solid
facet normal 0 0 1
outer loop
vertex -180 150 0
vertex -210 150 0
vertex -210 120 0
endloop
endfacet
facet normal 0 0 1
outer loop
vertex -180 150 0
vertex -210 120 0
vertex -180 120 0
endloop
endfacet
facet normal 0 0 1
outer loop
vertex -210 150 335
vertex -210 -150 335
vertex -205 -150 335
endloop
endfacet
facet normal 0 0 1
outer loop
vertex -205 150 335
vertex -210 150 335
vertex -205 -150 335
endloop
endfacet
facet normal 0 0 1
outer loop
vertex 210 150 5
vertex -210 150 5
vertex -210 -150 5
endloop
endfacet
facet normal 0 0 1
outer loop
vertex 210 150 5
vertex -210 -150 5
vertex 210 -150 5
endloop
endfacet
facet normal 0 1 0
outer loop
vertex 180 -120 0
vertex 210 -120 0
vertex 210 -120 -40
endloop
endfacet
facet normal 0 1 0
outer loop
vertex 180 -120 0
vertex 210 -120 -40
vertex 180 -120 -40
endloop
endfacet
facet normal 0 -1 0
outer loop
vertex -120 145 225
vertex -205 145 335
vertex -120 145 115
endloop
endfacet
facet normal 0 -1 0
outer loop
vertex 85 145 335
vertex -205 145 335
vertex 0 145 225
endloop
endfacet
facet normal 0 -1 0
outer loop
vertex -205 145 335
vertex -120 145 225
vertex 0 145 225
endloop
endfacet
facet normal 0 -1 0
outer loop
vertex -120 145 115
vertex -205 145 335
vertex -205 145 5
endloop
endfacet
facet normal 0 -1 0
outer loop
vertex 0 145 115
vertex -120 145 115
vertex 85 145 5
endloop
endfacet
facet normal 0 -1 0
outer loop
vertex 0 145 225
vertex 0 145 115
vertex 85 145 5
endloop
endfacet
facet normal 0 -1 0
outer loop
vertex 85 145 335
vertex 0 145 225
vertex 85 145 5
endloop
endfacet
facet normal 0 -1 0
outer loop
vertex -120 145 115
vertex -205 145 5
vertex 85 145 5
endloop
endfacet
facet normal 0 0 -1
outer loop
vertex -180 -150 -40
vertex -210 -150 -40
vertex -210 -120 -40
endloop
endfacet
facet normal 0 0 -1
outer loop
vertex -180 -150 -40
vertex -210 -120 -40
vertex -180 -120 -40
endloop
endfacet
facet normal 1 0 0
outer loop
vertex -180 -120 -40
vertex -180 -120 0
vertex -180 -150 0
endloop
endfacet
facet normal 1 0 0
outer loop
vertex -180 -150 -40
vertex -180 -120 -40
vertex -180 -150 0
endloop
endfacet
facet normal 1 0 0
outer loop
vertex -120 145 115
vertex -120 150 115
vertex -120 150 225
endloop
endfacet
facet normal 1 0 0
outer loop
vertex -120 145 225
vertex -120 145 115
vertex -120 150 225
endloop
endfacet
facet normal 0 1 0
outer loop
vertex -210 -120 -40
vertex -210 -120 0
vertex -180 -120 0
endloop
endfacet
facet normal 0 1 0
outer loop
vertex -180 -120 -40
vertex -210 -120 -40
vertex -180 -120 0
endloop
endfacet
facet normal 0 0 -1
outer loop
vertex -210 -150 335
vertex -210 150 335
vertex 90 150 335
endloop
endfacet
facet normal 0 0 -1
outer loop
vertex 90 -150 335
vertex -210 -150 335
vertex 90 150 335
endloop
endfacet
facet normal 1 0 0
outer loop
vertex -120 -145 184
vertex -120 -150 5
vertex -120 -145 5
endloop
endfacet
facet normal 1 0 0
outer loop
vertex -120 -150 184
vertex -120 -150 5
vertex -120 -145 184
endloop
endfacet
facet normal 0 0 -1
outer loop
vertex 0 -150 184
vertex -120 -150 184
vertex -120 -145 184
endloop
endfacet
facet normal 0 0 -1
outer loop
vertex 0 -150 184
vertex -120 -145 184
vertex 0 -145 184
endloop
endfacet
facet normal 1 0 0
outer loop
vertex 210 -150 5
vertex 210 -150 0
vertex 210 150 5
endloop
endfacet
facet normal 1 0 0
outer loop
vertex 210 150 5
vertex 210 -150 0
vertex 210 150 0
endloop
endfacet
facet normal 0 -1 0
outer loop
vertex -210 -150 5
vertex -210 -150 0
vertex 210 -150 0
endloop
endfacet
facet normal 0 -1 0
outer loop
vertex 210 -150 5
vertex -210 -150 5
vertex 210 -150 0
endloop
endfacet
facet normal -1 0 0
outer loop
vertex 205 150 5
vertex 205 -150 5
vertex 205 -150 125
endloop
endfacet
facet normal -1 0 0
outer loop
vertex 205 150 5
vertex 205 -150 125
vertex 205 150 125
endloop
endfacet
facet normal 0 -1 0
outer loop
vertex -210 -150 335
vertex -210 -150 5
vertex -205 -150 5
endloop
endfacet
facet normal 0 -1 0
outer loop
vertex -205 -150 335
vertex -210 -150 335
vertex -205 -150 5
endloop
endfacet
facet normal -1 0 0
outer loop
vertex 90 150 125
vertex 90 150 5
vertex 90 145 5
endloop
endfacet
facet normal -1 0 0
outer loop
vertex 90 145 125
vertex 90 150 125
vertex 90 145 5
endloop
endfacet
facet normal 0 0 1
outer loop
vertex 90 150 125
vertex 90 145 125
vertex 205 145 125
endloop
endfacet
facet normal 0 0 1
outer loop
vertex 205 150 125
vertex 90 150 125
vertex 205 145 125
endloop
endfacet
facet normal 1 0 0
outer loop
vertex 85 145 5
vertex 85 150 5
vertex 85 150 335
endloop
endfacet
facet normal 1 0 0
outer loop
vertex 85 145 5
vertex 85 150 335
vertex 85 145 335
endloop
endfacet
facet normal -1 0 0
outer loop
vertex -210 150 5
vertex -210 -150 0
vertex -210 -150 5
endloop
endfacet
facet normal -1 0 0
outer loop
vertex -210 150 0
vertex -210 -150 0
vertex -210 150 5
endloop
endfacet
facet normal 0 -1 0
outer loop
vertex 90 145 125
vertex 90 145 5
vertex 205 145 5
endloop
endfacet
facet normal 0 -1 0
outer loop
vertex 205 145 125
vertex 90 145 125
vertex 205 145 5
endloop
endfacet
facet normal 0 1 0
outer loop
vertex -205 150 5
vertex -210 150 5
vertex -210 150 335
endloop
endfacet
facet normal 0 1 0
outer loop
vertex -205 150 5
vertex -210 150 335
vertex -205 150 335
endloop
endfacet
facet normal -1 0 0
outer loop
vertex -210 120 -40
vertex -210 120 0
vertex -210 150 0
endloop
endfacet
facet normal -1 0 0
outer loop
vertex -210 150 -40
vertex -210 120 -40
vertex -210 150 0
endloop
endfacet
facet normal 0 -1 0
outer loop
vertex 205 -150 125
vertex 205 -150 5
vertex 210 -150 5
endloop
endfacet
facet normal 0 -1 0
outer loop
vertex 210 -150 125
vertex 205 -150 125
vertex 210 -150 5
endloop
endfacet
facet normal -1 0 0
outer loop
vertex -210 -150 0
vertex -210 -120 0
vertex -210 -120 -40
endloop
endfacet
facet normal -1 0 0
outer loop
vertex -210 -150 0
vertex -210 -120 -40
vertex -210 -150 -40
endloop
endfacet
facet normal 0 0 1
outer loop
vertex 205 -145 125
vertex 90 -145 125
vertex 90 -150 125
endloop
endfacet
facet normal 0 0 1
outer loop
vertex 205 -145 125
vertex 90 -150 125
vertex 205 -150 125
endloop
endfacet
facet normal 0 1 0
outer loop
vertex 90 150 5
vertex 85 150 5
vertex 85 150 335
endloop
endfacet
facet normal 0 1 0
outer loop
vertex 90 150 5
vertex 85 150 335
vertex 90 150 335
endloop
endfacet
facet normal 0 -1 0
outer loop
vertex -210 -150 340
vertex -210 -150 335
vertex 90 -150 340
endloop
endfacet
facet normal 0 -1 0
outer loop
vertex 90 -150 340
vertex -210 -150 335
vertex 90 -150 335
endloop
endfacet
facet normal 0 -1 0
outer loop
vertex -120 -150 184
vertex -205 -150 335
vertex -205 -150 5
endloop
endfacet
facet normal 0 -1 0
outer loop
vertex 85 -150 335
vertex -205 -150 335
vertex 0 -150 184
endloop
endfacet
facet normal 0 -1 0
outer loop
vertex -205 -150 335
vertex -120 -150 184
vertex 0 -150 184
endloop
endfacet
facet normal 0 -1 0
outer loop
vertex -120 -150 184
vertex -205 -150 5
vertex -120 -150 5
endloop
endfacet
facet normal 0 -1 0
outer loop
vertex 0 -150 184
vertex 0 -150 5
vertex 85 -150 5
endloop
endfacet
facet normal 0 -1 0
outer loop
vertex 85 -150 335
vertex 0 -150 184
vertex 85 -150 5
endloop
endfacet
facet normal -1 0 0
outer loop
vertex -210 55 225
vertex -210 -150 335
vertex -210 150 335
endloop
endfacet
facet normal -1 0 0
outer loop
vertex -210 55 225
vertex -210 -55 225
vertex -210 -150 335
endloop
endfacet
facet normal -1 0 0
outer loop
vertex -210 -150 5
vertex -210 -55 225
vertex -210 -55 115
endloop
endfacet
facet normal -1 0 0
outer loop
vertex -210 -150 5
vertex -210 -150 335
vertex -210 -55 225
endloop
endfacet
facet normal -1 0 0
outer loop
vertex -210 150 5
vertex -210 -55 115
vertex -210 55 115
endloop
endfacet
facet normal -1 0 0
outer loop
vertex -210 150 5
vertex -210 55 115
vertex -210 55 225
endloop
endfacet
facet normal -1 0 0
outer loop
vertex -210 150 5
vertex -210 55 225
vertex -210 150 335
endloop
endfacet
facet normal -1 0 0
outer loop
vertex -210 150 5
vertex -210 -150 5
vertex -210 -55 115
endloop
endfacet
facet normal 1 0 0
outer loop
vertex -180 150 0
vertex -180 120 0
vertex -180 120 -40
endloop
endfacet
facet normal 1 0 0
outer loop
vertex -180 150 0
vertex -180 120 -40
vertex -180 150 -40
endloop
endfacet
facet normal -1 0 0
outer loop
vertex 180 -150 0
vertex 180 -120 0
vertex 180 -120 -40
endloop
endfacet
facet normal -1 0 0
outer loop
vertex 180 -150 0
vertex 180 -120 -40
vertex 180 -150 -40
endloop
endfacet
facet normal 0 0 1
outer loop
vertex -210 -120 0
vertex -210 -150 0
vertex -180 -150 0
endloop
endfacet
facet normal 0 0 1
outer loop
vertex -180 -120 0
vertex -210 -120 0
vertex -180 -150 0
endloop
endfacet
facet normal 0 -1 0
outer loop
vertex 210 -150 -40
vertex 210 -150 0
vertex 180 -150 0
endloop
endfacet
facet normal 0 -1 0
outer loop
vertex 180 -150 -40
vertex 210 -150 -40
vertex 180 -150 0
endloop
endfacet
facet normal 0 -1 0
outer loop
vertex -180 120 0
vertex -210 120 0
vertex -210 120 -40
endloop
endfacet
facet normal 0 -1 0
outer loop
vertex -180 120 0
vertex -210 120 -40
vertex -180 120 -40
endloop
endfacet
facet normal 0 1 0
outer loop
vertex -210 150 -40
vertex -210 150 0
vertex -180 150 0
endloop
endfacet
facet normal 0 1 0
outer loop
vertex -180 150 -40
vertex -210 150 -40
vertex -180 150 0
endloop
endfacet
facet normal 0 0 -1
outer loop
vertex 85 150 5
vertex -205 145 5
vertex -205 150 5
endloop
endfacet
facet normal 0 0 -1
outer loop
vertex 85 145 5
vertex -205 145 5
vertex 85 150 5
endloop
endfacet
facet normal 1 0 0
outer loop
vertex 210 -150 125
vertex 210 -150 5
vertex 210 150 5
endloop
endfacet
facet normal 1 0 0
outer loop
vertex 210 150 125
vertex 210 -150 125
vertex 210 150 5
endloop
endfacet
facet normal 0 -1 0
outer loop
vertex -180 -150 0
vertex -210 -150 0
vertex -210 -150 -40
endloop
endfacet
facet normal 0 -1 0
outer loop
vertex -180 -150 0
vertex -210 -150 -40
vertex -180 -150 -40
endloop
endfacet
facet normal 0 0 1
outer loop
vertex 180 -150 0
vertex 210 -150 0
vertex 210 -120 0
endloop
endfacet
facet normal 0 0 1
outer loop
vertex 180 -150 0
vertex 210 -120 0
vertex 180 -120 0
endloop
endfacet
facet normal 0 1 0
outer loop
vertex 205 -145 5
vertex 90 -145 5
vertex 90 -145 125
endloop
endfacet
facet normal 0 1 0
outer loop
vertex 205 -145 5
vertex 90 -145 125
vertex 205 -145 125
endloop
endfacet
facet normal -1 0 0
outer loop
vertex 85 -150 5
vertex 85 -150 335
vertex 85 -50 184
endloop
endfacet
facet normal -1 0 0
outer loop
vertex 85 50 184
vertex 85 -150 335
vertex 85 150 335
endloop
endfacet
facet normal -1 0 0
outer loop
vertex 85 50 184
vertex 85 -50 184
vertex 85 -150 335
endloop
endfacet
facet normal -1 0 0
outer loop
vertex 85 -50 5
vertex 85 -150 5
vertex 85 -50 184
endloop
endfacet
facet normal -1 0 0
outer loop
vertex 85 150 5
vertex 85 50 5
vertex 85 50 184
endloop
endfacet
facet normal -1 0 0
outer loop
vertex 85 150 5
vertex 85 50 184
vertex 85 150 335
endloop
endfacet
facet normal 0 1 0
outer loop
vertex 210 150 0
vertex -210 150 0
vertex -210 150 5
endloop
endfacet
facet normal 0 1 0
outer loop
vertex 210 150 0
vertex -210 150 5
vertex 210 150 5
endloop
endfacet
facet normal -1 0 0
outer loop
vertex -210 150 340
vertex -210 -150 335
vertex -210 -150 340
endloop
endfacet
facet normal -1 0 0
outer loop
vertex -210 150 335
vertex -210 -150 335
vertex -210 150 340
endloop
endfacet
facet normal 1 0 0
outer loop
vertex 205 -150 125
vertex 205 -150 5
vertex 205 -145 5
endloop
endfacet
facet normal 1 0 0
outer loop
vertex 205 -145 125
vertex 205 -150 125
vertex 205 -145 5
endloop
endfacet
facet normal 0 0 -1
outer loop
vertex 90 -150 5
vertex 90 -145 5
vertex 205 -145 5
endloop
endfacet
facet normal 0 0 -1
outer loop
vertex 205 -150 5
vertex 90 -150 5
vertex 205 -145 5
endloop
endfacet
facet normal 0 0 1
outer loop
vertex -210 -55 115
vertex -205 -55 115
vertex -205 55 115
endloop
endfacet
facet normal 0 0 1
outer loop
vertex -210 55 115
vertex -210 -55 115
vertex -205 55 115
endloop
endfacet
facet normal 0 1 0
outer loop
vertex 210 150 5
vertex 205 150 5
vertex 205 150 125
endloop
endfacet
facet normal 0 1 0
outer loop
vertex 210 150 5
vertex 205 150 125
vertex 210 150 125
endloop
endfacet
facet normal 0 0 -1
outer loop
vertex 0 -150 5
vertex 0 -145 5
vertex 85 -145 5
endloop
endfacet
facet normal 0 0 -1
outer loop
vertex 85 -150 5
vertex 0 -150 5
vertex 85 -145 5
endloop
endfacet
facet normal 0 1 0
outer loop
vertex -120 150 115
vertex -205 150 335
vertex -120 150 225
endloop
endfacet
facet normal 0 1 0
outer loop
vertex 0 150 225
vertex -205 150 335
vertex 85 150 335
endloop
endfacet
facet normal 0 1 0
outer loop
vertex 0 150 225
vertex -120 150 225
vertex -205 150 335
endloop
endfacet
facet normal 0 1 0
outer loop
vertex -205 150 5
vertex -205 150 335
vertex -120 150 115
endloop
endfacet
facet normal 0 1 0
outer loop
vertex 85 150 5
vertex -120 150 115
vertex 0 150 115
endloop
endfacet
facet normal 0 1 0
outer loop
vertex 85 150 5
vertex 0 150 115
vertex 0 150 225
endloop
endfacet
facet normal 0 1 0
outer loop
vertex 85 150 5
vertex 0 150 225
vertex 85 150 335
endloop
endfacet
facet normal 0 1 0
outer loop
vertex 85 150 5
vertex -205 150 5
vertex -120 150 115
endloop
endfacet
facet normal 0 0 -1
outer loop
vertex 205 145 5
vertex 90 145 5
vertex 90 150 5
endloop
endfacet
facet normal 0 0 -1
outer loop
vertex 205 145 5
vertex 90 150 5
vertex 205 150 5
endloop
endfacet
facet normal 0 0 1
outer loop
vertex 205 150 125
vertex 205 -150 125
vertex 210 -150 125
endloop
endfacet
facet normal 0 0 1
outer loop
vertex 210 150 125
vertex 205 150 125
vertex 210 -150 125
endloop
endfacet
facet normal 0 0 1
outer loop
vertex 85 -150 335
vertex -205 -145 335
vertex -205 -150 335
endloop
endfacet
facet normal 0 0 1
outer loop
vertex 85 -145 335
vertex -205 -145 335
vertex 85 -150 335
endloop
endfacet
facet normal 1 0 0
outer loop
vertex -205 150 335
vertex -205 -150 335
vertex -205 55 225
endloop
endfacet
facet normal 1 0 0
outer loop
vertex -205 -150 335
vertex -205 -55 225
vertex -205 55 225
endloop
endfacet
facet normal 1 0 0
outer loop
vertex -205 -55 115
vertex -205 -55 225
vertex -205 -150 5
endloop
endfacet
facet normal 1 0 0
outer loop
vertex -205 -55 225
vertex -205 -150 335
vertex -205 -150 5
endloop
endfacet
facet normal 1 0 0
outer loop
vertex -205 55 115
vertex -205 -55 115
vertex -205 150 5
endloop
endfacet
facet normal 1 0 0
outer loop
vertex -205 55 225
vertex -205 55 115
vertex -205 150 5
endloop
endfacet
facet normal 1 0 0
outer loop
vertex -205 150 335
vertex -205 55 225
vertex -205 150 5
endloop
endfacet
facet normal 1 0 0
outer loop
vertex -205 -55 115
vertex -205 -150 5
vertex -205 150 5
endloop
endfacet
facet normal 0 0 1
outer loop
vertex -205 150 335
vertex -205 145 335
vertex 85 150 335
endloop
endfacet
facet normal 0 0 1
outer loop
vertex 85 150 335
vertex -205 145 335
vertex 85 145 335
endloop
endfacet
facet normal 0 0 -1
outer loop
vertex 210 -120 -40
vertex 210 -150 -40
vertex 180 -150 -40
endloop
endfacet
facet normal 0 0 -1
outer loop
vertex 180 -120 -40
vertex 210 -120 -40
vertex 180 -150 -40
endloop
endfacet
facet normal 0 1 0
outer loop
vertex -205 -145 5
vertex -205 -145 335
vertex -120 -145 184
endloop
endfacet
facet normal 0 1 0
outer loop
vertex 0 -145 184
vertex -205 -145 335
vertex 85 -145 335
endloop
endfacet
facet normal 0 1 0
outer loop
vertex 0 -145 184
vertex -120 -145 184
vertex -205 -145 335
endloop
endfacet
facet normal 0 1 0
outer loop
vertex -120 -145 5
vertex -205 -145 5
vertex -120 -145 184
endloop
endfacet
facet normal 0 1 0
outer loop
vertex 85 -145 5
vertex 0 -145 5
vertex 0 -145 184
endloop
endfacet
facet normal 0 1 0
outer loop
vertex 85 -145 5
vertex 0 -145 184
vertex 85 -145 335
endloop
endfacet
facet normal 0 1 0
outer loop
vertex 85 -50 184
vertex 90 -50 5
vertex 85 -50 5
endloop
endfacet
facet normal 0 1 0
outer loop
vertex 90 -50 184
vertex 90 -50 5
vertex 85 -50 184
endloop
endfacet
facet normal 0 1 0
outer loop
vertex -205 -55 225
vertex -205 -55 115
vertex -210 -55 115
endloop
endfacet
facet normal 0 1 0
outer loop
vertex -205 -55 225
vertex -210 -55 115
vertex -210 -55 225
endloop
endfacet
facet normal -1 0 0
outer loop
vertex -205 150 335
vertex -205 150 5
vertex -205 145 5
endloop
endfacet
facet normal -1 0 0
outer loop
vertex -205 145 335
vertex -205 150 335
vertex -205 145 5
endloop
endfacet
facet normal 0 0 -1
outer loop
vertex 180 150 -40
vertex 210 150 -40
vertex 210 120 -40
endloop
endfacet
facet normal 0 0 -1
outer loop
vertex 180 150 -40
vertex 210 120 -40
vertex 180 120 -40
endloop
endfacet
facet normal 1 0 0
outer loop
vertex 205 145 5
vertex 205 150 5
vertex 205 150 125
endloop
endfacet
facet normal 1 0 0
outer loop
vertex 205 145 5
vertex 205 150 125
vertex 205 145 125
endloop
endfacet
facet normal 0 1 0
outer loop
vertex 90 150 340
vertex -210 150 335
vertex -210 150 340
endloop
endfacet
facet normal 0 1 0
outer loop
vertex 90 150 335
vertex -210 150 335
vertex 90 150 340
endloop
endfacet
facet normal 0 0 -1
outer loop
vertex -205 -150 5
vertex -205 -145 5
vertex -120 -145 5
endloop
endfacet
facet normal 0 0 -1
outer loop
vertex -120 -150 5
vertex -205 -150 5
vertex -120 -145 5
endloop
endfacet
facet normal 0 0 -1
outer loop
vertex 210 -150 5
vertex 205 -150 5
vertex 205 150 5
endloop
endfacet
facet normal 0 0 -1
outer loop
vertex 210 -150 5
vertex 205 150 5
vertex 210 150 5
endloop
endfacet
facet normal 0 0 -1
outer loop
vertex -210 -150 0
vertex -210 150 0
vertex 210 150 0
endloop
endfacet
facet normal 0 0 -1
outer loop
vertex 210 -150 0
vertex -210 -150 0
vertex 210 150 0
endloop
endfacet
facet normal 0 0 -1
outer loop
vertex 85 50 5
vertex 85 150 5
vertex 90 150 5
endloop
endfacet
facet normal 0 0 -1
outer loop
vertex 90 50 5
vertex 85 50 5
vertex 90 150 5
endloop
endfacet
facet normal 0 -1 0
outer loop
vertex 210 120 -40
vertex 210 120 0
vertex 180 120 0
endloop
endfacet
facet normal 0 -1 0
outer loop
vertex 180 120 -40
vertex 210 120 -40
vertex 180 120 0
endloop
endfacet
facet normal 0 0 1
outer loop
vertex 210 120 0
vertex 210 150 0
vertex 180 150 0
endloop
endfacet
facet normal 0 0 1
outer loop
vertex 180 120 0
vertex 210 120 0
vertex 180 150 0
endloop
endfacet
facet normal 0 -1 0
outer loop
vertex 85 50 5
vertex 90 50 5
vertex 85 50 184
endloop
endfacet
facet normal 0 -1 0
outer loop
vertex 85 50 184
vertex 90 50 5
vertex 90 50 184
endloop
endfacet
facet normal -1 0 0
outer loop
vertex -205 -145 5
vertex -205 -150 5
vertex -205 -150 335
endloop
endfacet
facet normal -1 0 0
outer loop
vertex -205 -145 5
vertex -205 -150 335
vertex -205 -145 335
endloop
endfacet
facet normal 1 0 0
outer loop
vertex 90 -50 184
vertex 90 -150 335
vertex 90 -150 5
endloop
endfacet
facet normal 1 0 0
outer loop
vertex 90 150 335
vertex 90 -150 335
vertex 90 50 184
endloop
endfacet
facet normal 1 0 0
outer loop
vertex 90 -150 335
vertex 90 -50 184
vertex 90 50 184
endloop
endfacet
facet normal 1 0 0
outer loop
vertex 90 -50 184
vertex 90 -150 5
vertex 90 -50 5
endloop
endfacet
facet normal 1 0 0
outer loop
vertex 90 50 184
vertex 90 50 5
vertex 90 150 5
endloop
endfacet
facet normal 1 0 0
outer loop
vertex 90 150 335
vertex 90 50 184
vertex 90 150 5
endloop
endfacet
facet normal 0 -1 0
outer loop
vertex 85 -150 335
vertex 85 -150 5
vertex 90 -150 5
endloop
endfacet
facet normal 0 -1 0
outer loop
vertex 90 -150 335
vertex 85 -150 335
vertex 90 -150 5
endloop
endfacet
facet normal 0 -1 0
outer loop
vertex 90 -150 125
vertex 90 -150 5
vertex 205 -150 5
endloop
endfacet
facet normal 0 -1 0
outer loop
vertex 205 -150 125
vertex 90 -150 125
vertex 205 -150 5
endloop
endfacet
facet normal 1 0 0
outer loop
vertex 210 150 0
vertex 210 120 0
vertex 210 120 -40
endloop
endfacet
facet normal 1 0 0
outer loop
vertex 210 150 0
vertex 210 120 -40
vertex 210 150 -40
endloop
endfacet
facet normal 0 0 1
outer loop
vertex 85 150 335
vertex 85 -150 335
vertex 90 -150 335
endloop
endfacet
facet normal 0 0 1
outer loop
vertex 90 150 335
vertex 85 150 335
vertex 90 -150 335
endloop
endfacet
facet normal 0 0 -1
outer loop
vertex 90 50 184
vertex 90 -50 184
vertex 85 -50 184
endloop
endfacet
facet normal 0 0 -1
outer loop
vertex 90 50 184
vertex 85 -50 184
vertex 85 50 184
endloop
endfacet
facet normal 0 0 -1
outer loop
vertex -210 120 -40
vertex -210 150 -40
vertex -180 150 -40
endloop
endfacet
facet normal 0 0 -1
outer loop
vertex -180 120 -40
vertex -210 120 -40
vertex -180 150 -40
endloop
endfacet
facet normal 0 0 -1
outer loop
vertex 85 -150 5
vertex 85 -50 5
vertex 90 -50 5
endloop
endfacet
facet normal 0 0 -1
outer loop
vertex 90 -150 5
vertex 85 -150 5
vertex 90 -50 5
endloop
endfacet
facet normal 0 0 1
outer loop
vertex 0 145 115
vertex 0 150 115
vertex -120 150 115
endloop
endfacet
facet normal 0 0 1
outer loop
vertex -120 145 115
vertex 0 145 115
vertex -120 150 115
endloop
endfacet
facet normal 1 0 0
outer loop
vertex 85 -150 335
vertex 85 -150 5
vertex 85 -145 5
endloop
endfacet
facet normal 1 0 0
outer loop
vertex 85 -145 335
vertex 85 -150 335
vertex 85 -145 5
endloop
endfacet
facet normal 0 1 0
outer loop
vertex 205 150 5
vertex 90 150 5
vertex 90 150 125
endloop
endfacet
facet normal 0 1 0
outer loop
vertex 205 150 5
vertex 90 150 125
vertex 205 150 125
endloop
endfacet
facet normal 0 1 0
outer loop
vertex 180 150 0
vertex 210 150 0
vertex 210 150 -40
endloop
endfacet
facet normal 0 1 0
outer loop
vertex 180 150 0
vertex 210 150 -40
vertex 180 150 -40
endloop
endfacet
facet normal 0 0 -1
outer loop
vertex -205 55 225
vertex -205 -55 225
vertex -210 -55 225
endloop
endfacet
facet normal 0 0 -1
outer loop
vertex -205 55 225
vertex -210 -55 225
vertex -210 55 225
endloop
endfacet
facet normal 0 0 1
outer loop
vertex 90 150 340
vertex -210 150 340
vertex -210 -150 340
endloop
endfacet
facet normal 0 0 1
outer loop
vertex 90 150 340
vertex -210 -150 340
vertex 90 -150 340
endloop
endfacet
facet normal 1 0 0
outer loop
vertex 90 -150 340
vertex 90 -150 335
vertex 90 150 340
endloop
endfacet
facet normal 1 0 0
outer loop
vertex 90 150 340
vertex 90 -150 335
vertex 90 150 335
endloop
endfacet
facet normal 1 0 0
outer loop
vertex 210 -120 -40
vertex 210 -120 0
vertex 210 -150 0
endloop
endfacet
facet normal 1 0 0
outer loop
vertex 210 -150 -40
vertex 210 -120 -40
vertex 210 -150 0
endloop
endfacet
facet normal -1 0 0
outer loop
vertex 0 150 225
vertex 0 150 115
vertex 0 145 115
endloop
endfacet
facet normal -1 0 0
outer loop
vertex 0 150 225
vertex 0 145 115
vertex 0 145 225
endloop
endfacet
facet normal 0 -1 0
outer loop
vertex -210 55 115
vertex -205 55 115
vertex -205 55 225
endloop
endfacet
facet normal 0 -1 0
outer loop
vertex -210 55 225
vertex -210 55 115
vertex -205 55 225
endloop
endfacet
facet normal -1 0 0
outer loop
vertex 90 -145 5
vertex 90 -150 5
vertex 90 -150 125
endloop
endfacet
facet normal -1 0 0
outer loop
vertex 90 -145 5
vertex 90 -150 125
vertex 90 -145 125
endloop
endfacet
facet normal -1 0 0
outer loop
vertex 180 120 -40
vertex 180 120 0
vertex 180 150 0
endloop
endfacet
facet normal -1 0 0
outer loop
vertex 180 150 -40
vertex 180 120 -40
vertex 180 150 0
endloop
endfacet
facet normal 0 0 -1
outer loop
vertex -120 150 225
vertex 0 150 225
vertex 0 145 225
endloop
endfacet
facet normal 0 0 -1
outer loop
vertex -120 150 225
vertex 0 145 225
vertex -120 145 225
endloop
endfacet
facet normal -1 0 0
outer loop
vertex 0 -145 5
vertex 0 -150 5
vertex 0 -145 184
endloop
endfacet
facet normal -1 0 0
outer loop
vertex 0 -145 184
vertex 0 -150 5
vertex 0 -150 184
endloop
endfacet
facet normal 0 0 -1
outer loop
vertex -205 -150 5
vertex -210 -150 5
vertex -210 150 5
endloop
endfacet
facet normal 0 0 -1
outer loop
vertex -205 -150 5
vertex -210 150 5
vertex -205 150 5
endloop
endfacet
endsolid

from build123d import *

# Parameters (mm, degrees)
F0_W      = 420
F0_H      = 300
F1_DEPTH  = 5
F2_W      = 30
F2_H      = 30
F3_DEPTH  = 40
F6_W      = 5
F6_H      = 300
F7_DEPTH  = 330
F8_W      = 5
F8_H      = 300
F9_DEPTH  = 330
F10_W     = 290
F10_H     = 5
F11_DEPTH = 330
F13_W     = 100
F13_H     = 179
F14_DEPTH = 5
F15_W     = 5
F15_H     = 300
F16_DEPTH = 120
F17_W     = 115
F17_H     = 5
F18_DEPTH = 120
F20_W     = 300
F20_H     = 300
F21_DEPTH = 5
F22_W     = 120
F22_H     = 179
F23_DEPTH = 5
F24_W     = 110
F24_H     = 110
F25_DEPTH = 25
F26_W     = 120
F26_H     = 110
F27_DEPTH = 5


with BuildPart() as f1:
    # F0 (on Top) → F1 (new body)
    with BuildSketch(Plane.XY):
        Rectangle(F0_W, F0_H)
    extrude(amount=F1_DEPTH)


with BuildPart() as f3:
    # F2 (on face) → F3 (new body)
    with BuildSketch(Plane(origin=(0, 0, 0), x_dir=(1, 0, 0), z_dir=(0, 0, -1))):
        with Locations((-195, 135)):
            Rectangle(F2_W, F2_H)
    extrude(amount=F3_DEPTH)


with BuildPart() as f4_1:
    # F4: instance of F3
    add(f3.part.mirror(Plane.XZ))


with BuildPart() as f5_1:
    # F5: instance of F3
    add(f3.part.mirror(Plane.YZ))


with BuildPart() as f5_2:
    # F5: instance of F4_1
    add(f4_1.part.mirror(Plane.YZ))


with BuildPart() as f7:
    # F6 (on face) → F7 (new body)
    with BuildSketch(Plane.XY.offset(5)):
        with Locations((-207.5, 0)):
            Rectangle(F6_W, F6_H)
    extrude(amount=F7_DEPTH)

    # F24 (on face) → F25 (cut)
    with BuildSketch(Plane.YZ.offset(-205)):
        with Locations((0, 170)):
            Rectangle(F24_W, F24_H)
    extrude(amount=-F25_DEPTH, mode=Mode.SUBTRACT)


with BuildPart() as f9:
    # F8 (on face) → F9 (new body, through all)
    with BuildSketch(Plane.XY.offset(5)):
        with Locations((87.5, 0)):
            Rectangle(F8_W, F8_H)
    extrude(amount=F9_DEPTH)

    # F13 (on face) → F14 (cut, through all)
    with BuildSketch(Plane.YZ.offset(90)):
        with Locations((0, 94.5)):
            Rectangle(F13_W, F13_H)
    extrude(amount=-F14_DEPTH, mode=Mode.SUBTRACT)


with BuildPart() as f11:
    # F10 (on face) → F11 (new body, through all)
    with BuildSketch(Plane.XY.offset(5)):
        with Locations((-60, -147.5)):
            Rectangle(F10_W, F10_H)
    extrude(amount=F11_DEPTH)


with BuildPart() as f12_1:
    # F12: instance of F11
    add(f11.part.mirror(Plane.XZ))

    # F26 (on face) → F27 (cut, through all)
    with BuildSketch(Plane(origin=(0, 150, 0), x_dir=(-1, 0, 0), z_dir=(0, 1, 0))):
        with Locations((60, 170)):
            Rectangle(F26_W, F26_H)
    extrude(amount=-F27_DEPTH, mode=Mode.SUBTRACT)


with BuildPart() as f16:
    # F15 (on face) → F16 (new body)
    with BuildSketch(Plane.XY.offset(5)):
        with Locations((207.5, 0)):
            Rectangle(F15_W, F15_H)
    extrude(amount=F16_DEPTH)


with BuildPart() as f18:
    # F17 (on face) → F18 (new body, through all)
    with BuildSketch(Plane.XY.offset(5)):
        with Locations((147.5, -147.5)):
            Rectangle(F17_W, F17_H)
    extrude(amount=F18_DEPTH)


with BuildPart() as f19_1:
    # F19: instance of F18
    add(f18.part.mirror(Plane.XZ))


with BuildPart() as f21:
    # F20 (on face) → F21 (new body)
    with BuildSketch(Plane.XY.offset(335)):
        with Locations((-60, 0)):
            Rectangle(F20_W, F20_H)
    extrude(amount=F21_DEPTH)


with BuildPart() as f11_1:
    add(f11.part)

    # F22 (on face) → F23 (cut, through all)
    with BuildSketch(Plane.XZ.offset(150)):
        with Locations((-60, 94.5)):
            Rectangle(F22_W, F22_H)
    extrude(amount=-F23_DEPTH, mode=Mode.SUBTRACT)


solid = Compound([f1.part, f3.part, f4_1.part, f5_1.part, f5_2.part, f7.part, f9.part, f12_1.part, f16.part, f18.part, f19_1.part, f21.part, f11_1.part])
